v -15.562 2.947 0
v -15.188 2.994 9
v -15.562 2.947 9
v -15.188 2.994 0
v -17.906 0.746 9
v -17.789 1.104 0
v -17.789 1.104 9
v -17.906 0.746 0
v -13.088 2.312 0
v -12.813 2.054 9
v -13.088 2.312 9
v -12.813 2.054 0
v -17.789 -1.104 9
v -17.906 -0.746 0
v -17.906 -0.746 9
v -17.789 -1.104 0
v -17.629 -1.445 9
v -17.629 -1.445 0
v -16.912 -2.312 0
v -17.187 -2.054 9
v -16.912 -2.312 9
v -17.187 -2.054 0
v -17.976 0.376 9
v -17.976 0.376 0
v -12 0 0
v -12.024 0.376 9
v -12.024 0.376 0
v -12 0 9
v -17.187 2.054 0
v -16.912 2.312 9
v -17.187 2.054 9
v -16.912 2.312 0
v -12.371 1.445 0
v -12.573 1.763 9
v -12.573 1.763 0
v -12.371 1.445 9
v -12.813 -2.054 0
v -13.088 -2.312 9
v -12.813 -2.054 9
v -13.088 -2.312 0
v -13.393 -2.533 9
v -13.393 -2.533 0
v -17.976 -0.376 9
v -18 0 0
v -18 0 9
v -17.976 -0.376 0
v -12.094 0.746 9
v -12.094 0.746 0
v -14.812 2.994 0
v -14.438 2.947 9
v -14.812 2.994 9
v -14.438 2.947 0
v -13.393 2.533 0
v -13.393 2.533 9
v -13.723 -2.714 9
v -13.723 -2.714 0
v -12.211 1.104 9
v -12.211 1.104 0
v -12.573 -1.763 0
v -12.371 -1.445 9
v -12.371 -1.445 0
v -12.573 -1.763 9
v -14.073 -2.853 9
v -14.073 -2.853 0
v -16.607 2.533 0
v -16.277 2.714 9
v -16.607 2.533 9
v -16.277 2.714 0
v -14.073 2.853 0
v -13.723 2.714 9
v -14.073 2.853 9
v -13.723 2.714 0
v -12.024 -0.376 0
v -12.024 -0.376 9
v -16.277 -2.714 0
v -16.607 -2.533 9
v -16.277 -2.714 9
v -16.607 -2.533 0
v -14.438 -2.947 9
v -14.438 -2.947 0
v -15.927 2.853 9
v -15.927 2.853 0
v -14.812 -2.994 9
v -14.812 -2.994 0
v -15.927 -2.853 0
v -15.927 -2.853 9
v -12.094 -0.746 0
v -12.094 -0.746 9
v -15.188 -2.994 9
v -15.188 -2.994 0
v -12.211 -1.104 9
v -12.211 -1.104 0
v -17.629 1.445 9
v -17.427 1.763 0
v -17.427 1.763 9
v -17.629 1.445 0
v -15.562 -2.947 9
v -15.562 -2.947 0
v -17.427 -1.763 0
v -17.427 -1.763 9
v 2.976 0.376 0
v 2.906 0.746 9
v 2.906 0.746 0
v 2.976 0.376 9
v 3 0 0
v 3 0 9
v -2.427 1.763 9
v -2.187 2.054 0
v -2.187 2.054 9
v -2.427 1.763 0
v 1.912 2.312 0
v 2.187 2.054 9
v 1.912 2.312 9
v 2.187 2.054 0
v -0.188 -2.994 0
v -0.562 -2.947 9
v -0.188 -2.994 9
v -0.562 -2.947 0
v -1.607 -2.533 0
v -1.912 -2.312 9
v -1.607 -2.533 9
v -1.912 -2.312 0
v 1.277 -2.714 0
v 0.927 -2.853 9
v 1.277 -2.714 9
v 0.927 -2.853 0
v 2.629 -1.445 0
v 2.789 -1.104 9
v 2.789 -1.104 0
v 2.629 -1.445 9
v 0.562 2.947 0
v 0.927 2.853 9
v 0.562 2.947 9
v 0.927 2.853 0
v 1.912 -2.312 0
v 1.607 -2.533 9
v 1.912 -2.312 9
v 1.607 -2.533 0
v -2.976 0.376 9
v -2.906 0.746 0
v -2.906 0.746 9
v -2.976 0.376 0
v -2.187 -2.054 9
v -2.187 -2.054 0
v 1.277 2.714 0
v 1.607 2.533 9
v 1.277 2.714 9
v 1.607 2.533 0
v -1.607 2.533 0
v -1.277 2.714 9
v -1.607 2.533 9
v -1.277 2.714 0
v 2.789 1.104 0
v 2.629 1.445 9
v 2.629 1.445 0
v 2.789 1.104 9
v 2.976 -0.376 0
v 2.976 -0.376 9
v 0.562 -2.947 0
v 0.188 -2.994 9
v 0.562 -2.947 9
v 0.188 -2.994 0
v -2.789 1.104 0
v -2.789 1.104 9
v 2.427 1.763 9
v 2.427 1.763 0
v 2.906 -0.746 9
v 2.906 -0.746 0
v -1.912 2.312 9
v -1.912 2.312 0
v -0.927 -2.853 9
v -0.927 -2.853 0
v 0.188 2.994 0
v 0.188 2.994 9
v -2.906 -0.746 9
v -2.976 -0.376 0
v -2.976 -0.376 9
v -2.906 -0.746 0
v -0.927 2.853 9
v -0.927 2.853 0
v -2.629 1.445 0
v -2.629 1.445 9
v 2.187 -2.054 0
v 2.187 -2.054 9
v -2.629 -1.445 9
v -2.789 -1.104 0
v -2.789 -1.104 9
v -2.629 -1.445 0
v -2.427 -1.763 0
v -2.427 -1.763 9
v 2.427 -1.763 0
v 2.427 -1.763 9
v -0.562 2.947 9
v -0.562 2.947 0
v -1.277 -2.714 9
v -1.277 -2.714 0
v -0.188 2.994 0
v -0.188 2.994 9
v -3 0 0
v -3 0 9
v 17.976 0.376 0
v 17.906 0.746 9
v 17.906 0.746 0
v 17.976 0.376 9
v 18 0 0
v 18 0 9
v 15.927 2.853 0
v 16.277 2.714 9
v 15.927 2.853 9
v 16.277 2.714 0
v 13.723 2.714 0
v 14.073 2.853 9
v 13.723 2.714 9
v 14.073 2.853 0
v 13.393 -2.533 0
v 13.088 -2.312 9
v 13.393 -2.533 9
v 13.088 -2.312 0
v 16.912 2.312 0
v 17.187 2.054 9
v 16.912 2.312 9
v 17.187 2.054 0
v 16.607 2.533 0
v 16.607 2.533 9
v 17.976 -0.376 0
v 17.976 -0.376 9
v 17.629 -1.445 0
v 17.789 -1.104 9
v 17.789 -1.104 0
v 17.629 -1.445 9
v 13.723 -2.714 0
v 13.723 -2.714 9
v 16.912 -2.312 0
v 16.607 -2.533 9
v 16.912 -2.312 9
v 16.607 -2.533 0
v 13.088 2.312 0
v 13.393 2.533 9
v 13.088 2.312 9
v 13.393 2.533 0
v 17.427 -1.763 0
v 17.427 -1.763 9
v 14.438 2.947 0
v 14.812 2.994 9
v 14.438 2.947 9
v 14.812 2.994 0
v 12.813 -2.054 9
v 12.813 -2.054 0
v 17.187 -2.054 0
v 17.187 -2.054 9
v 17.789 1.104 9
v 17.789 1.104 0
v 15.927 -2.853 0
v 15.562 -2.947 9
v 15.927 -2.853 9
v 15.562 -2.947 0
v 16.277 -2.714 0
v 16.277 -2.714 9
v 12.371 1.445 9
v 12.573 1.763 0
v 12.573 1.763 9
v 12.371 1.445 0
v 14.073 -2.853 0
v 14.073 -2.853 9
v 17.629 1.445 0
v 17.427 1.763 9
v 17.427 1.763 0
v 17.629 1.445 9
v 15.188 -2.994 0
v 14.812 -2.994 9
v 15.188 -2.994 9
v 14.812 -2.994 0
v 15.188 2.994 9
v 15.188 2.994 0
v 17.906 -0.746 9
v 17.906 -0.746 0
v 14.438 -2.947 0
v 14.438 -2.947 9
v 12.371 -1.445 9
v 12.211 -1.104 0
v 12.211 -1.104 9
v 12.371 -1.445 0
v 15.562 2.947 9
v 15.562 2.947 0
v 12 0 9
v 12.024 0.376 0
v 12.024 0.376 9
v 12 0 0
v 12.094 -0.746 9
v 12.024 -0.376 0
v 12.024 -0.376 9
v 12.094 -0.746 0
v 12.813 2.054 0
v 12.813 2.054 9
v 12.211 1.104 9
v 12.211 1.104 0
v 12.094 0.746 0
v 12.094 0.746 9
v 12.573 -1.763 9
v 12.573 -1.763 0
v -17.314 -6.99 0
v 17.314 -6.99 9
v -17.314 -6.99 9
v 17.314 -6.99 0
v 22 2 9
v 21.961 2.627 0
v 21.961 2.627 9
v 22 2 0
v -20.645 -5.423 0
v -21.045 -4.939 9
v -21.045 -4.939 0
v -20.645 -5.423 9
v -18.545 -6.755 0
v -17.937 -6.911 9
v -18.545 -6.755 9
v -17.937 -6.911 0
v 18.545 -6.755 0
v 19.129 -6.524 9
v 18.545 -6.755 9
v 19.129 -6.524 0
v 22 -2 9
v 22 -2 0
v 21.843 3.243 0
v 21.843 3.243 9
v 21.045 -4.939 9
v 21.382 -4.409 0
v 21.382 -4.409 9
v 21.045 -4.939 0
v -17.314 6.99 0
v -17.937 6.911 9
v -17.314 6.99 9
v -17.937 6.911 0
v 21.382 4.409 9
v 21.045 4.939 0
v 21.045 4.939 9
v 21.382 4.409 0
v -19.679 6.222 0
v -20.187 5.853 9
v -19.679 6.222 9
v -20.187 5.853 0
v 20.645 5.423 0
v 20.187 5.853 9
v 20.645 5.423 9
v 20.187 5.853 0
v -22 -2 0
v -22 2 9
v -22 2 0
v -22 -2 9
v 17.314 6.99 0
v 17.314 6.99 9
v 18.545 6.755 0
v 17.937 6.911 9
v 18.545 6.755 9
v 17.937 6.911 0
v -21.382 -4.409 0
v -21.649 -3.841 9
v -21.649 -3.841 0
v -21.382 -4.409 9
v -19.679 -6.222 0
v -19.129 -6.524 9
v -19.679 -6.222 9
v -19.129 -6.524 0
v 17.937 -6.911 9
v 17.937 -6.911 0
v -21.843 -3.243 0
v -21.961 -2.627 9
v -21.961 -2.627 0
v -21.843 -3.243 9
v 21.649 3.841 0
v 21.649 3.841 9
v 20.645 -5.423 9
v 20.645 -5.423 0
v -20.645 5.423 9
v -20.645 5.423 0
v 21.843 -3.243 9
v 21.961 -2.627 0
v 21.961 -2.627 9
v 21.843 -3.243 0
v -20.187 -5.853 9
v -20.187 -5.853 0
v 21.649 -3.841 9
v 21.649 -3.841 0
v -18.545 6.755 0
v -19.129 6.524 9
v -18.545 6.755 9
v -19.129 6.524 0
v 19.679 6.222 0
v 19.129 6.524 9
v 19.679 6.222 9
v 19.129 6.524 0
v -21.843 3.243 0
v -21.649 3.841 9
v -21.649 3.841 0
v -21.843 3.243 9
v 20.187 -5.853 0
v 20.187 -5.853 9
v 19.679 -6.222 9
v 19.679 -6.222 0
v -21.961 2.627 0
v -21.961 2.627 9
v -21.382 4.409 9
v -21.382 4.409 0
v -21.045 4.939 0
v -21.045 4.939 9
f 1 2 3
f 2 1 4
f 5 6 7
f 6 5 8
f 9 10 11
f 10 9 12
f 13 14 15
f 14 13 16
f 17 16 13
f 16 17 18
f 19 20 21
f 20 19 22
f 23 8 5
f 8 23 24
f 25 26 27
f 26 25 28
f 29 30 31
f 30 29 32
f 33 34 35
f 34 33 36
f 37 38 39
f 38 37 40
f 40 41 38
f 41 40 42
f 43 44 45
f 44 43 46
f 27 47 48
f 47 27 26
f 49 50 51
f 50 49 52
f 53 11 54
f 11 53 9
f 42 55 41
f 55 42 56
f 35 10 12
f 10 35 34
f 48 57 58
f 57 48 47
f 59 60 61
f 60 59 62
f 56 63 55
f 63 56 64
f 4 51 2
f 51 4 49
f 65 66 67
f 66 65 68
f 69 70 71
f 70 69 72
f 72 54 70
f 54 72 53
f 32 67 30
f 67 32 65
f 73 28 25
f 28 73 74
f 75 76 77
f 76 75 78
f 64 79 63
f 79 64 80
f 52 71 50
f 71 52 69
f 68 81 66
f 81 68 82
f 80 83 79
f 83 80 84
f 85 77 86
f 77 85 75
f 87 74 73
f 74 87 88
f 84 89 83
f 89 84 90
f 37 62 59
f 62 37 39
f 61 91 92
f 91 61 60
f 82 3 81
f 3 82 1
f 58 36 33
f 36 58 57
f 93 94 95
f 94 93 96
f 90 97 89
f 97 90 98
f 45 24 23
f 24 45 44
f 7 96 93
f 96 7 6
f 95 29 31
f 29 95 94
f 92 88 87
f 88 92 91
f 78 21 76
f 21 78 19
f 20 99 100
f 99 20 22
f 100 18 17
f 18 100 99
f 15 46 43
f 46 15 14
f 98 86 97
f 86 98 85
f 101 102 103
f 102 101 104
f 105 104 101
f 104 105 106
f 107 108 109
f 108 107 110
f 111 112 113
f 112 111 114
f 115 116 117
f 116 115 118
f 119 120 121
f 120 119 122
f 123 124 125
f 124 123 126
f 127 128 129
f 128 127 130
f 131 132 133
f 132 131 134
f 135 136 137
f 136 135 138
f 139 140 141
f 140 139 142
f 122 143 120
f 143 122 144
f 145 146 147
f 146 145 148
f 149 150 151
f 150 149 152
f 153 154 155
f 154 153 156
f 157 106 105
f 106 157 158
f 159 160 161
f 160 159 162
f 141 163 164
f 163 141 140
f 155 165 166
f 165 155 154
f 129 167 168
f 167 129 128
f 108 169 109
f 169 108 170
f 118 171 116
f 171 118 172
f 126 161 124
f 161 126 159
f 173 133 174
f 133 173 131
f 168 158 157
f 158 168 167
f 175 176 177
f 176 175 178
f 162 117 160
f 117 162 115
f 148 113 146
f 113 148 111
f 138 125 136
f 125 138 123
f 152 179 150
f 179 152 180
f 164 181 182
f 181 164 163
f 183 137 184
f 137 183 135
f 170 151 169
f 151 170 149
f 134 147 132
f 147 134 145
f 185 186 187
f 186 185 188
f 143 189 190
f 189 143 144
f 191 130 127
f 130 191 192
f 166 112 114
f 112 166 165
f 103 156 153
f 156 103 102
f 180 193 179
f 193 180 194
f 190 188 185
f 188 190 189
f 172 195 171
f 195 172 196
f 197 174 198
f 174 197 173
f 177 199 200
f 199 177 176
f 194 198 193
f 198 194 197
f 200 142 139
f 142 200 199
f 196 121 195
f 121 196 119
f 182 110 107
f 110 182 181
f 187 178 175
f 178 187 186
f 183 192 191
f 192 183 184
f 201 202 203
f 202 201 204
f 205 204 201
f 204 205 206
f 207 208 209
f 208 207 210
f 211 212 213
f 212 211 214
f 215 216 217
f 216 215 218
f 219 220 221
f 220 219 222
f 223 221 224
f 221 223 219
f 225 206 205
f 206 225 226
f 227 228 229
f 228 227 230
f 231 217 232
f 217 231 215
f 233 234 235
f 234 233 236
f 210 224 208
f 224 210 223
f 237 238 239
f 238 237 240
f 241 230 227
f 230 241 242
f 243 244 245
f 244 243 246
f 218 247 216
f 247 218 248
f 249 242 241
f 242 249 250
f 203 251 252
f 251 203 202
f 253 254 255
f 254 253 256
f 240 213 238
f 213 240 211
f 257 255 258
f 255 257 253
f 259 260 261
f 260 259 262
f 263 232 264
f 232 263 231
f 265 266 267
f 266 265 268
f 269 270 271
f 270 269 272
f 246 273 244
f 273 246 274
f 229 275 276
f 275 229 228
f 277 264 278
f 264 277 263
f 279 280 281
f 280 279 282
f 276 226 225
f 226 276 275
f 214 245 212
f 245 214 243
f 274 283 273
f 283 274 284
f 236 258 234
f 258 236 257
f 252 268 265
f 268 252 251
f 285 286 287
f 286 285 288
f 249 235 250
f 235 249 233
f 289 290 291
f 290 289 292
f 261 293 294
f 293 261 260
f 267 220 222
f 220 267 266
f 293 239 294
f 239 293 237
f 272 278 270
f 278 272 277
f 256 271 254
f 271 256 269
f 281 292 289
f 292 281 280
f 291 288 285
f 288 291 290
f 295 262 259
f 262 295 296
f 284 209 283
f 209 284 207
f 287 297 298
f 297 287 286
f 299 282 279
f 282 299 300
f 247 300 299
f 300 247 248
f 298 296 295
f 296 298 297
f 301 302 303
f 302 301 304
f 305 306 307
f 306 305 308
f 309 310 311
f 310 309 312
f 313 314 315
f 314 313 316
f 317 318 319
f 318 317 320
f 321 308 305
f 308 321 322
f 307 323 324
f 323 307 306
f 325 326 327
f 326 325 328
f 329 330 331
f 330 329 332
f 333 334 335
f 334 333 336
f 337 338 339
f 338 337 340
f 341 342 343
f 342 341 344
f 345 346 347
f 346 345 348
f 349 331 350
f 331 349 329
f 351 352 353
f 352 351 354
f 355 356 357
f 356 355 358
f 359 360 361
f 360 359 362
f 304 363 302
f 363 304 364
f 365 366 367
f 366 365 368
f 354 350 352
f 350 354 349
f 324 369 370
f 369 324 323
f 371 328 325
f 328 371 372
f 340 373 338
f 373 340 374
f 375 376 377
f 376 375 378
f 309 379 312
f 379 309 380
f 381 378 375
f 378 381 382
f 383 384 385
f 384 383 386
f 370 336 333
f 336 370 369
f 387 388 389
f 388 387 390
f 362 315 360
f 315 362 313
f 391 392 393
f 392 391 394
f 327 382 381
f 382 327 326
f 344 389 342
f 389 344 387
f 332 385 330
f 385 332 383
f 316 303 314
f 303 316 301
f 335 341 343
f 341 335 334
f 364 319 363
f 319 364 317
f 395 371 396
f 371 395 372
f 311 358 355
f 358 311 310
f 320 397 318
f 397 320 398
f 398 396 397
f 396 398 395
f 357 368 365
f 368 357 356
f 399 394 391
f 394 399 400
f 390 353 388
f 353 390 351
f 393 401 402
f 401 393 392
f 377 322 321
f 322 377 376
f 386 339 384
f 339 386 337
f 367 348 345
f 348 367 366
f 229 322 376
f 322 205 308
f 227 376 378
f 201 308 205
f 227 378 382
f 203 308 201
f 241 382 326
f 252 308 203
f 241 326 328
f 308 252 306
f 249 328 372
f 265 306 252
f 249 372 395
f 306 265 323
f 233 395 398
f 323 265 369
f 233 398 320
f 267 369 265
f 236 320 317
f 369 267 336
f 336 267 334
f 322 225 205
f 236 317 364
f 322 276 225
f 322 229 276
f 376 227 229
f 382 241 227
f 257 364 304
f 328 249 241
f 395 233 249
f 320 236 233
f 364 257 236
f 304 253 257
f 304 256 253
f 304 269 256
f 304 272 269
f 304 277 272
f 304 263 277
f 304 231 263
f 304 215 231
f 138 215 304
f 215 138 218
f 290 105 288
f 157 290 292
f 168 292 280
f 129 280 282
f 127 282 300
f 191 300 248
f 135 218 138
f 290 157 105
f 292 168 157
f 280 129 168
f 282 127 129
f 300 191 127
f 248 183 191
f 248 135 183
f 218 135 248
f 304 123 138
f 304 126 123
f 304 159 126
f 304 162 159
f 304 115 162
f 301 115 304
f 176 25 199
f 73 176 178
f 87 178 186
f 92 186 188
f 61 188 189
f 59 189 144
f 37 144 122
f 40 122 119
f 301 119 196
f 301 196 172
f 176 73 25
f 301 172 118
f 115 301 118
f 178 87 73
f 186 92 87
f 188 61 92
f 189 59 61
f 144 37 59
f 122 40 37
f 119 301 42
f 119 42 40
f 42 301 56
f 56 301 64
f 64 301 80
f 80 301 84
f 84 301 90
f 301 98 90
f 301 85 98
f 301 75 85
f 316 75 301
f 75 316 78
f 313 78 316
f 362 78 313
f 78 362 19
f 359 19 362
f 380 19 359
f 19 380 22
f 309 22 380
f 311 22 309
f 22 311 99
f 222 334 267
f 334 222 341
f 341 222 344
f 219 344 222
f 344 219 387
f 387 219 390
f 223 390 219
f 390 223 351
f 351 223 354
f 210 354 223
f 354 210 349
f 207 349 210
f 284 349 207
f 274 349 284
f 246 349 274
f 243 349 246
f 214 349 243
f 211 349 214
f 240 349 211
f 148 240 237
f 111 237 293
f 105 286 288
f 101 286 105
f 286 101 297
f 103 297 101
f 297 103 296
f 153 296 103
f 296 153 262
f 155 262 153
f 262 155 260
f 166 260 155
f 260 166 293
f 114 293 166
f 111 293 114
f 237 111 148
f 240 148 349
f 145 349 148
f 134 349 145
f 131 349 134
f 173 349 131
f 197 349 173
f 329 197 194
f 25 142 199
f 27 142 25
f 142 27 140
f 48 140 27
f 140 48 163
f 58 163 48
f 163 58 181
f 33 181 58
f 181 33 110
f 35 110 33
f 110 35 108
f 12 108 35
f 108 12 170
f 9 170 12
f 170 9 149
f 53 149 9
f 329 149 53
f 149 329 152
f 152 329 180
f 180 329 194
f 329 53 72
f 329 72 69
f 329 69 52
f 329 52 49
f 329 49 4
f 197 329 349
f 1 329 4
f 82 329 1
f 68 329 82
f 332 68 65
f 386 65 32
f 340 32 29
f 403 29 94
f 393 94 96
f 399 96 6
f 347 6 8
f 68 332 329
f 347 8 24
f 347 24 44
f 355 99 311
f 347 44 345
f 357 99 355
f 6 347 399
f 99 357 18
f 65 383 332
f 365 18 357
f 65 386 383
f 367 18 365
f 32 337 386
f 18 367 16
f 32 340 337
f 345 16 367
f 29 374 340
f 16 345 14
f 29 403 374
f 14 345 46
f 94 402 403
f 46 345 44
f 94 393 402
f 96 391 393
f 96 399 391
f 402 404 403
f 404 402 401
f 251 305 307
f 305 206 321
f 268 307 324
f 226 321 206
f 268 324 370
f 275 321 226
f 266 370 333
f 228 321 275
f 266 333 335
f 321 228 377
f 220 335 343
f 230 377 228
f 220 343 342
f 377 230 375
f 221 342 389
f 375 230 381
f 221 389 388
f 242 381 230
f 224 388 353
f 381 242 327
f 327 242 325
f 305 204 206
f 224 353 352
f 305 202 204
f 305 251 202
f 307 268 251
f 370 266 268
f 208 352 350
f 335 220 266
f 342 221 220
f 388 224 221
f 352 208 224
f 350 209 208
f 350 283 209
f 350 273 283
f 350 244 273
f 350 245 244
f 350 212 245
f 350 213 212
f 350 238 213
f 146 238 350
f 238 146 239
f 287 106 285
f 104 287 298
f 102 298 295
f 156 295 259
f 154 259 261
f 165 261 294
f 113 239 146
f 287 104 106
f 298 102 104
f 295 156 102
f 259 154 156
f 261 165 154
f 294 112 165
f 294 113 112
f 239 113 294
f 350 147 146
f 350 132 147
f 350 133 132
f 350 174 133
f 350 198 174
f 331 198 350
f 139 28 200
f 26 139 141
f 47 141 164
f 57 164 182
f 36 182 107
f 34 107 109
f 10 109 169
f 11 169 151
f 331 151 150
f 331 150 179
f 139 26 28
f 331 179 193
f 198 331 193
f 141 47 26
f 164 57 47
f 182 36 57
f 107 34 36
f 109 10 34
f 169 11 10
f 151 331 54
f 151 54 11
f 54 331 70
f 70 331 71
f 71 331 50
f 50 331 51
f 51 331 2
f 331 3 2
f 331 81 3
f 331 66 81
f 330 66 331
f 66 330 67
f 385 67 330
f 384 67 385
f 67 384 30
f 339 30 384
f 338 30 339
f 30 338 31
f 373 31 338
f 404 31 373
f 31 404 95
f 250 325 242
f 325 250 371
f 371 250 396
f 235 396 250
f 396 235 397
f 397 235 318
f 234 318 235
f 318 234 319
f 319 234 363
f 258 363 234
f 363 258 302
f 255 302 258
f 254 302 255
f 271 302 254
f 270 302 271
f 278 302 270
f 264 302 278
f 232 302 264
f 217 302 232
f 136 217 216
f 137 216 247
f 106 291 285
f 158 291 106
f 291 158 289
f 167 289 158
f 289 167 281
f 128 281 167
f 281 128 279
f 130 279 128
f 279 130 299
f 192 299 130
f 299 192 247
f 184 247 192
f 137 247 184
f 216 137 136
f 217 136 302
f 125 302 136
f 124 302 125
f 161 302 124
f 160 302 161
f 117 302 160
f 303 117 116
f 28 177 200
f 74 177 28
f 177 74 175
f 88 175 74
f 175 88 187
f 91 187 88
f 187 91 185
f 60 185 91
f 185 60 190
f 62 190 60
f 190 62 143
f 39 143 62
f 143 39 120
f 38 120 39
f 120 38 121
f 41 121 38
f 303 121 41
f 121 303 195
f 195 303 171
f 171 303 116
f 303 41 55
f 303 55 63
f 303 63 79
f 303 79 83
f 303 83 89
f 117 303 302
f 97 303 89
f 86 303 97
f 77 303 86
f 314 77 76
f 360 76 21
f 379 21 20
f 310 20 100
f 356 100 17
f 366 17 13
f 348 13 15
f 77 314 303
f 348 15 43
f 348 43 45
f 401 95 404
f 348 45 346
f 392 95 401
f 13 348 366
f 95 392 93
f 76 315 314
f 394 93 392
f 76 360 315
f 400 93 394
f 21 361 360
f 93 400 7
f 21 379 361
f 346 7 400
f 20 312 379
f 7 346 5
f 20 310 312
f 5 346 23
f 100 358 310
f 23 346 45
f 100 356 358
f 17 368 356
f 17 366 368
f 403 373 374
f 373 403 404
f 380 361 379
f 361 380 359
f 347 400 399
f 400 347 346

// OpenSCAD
$fn = 50;


difference() {
	union() {
		hull() {
			translate(v = [-17.0000000000, 2.0000000000, 0]) {
				cylinder(h = 9, r = 5);
			}
			translate(v = [17.0000000000, 2.0000000000, 0]) {
				cylinder(h = 9, r = 5);
			}
			translate(v = [-17.0000000000, -2.0000000000, 0]) {
				cylinder(h = 9, r = 5);
			}
			translate(v = [17.0000000000, -2.0000000000, 0]) {
				cylinder(h = 9, r = 5);
			}
		}
	}
	union() {
		translate(v = [-15.0000000000, 0.0000000000, 0]) {
			translate(v = [0, 0, -100]) {
				cylinder(h = 200, r = 3.0000000000);
			}
		}
		translate(v = [0, 0, -100]) {
			cylinder(h = 200, r = 3.0000000000);
		}
		translate(v = [15.0000000000, 0.0000000000, 0]) {
			translate(v = [0, 0, -100]) {
				cylinder(h = 200, r = 3.0000000000);
			}
		}
	}
}
